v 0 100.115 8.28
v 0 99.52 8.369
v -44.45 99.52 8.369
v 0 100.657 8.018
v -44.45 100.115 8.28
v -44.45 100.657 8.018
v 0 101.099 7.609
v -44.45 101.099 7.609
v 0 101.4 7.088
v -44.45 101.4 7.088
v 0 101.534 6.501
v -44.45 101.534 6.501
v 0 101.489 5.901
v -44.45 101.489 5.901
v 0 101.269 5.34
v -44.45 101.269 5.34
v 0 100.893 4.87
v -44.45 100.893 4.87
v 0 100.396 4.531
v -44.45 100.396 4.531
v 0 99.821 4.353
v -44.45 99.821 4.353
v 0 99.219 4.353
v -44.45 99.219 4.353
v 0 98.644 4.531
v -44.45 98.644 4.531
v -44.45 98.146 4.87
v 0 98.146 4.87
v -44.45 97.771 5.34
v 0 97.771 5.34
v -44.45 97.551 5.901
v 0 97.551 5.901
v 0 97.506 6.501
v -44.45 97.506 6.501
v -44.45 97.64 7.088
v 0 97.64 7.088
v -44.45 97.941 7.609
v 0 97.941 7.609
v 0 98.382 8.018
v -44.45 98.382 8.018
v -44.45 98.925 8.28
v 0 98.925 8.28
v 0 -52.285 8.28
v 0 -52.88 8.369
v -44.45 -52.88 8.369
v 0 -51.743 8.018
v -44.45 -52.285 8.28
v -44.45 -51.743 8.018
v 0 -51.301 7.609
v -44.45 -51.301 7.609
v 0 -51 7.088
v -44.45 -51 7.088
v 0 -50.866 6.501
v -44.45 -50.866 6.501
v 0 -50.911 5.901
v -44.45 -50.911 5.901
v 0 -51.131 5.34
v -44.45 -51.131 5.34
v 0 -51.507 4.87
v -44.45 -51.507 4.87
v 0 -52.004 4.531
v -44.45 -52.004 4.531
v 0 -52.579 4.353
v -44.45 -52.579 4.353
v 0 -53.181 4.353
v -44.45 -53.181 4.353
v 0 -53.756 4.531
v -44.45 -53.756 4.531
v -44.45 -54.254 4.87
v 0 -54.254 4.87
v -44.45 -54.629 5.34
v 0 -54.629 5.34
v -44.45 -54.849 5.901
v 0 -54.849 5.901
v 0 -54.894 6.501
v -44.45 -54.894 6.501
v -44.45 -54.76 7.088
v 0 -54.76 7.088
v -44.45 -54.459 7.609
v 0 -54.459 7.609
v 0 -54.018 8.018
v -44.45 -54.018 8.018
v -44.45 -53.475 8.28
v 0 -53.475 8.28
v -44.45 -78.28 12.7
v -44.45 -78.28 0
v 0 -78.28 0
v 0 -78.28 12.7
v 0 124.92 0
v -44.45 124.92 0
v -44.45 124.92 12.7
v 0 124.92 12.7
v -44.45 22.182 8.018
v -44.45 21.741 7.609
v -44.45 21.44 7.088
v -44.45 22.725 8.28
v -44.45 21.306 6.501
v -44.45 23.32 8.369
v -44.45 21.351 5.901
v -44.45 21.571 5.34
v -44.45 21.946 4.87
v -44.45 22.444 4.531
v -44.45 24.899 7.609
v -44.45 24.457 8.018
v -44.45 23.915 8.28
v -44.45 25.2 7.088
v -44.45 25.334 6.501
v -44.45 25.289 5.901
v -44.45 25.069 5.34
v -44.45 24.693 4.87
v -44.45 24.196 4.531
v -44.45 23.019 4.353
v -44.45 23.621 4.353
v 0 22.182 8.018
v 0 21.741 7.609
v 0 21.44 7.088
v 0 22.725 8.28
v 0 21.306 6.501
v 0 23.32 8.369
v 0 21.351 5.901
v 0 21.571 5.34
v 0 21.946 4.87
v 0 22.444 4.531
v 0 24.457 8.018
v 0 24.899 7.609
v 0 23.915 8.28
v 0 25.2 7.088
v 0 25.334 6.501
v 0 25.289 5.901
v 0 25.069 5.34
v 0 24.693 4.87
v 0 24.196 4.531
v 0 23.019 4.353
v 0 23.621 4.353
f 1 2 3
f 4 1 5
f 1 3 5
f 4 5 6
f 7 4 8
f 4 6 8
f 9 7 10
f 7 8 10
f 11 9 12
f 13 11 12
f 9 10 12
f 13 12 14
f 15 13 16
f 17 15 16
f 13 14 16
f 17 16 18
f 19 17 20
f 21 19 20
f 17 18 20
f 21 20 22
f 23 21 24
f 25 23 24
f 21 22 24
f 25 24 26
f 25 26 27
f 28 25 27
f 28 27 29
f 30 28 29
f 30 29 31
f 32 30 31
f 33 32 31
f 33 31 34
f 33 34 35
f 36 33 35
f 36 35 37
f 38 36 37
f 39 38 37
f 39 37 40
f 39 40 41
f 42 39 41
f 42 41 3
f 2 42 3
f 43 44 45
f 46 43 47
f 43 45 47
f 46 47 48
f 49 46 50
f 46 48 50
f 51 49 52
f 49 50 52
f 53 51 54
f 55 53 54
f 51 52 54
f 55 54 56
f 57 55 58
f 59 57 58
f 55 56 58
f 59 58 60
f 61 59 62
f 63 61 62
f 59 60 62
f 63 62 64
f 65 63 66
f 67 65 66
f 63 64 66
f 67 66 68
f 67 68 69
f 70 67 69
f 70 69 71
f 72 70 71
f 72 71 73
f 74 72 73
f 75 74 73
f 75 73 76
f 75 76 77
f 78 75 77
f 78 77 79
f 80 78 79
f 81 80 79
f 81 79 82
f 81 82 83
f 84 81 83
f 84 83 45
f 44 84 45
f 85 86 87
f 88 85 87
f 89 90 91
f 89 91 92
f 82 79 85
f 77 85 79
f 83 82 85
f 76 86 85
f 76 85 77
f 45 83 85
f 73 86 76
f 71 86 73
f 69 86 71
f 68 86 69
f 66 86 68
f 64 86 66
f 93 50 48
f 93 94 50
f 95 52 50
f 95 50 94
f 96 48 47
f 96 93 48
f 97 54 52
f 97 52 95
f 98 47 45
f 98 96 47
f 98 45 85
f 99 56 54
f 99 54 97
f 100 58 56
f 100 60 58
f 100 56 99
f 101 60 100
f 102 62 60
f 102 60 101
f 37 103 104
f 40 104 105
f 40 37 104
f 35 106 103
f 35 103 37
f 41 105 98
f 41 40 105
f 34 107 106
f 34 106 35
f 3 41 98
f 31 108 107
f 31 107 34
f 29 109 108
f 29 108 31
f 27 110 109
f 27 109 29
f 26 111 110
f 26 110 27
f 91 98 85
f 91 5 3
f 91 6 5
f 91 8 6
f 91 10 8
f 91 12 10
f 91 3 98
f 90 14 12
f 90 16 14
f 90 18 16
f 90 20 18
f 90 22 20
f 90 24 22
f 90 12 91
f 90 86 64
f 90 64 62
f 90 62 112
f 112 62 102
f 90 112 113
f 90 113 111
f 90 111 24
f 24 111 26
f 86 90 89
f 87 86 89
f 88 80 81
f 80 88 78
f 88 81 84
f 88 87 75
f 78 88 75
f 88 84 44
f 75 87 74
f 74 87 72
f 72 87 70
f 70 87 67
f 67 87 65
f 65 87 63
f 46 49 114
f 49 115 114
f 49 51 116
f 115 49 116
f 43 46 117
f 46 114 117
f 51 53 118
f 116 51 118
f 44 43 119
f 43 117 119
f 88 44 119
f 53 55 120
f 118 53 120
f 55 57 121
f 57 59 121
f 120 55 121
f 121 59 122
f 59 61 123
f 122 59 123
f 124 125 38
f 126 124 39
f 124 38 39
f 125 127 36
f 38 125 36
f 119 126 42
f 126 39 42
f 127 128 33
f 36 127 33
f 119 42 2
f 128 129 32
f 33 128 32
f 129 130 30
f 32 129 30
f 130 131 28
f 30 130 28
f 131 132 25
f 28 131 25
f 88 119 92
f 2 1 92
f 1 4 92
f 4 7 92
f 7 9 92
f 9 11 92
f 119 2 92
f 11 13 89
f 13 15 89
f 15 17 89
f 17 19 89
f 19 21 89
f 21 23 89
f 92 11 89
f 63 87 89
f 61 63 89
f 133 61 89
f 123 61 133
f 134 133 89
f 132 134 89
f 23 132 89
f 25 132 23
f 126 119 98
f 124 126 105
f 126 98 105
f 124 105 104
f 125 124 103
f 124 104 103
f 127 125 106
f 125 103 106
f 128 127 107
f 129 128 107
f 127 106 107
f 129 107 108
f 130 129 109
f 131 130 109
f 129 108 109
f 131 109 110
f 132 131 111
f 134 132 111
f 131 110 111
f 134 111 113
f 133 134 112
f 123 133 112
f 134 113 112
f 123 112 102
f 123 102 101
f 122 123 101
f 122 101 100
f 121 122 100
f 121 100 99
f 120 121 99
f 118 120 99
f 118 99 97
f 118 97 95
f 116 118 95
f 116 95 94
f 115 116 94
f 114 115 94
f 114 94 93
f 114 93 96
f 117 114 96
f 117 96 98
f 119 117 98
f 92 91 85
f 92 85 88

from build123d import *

# Parameters (mm, degrees)
SKETCH1_W              = 44.45
SKETCH1_H              = 203.2
BOSS_EXTRUDE1_DEPTH    = 12.7
F_10_32_TAPPED_HOLE1_D = 4.0386


with BuildPart() as part:
    # Sketch1 → Boss-Extrude1 (new body)
    with BuildSketch(Plane.XY):
        with Locations((-22.225, 23.319966314)):
            Rectangle(SKETCH1_W, SKETCH1_H)
    extrude(amount=BOSS_EXTRUDE1_DEPTH)

    # #10-32 Tapped Hole1 (through all)
    with Locations(Plane(origin=(0, 0, 0), x_dir=(0, 0, -1), z_dir=(1, 0, 0))):
        with Locations((-6.35, 99.519966314), (-6.35, 23.319966314), (-6.35, -52.880033686)):
            Hole(F_10_32_TAPPED_HOLE1_D / 2)


solid = part.part
